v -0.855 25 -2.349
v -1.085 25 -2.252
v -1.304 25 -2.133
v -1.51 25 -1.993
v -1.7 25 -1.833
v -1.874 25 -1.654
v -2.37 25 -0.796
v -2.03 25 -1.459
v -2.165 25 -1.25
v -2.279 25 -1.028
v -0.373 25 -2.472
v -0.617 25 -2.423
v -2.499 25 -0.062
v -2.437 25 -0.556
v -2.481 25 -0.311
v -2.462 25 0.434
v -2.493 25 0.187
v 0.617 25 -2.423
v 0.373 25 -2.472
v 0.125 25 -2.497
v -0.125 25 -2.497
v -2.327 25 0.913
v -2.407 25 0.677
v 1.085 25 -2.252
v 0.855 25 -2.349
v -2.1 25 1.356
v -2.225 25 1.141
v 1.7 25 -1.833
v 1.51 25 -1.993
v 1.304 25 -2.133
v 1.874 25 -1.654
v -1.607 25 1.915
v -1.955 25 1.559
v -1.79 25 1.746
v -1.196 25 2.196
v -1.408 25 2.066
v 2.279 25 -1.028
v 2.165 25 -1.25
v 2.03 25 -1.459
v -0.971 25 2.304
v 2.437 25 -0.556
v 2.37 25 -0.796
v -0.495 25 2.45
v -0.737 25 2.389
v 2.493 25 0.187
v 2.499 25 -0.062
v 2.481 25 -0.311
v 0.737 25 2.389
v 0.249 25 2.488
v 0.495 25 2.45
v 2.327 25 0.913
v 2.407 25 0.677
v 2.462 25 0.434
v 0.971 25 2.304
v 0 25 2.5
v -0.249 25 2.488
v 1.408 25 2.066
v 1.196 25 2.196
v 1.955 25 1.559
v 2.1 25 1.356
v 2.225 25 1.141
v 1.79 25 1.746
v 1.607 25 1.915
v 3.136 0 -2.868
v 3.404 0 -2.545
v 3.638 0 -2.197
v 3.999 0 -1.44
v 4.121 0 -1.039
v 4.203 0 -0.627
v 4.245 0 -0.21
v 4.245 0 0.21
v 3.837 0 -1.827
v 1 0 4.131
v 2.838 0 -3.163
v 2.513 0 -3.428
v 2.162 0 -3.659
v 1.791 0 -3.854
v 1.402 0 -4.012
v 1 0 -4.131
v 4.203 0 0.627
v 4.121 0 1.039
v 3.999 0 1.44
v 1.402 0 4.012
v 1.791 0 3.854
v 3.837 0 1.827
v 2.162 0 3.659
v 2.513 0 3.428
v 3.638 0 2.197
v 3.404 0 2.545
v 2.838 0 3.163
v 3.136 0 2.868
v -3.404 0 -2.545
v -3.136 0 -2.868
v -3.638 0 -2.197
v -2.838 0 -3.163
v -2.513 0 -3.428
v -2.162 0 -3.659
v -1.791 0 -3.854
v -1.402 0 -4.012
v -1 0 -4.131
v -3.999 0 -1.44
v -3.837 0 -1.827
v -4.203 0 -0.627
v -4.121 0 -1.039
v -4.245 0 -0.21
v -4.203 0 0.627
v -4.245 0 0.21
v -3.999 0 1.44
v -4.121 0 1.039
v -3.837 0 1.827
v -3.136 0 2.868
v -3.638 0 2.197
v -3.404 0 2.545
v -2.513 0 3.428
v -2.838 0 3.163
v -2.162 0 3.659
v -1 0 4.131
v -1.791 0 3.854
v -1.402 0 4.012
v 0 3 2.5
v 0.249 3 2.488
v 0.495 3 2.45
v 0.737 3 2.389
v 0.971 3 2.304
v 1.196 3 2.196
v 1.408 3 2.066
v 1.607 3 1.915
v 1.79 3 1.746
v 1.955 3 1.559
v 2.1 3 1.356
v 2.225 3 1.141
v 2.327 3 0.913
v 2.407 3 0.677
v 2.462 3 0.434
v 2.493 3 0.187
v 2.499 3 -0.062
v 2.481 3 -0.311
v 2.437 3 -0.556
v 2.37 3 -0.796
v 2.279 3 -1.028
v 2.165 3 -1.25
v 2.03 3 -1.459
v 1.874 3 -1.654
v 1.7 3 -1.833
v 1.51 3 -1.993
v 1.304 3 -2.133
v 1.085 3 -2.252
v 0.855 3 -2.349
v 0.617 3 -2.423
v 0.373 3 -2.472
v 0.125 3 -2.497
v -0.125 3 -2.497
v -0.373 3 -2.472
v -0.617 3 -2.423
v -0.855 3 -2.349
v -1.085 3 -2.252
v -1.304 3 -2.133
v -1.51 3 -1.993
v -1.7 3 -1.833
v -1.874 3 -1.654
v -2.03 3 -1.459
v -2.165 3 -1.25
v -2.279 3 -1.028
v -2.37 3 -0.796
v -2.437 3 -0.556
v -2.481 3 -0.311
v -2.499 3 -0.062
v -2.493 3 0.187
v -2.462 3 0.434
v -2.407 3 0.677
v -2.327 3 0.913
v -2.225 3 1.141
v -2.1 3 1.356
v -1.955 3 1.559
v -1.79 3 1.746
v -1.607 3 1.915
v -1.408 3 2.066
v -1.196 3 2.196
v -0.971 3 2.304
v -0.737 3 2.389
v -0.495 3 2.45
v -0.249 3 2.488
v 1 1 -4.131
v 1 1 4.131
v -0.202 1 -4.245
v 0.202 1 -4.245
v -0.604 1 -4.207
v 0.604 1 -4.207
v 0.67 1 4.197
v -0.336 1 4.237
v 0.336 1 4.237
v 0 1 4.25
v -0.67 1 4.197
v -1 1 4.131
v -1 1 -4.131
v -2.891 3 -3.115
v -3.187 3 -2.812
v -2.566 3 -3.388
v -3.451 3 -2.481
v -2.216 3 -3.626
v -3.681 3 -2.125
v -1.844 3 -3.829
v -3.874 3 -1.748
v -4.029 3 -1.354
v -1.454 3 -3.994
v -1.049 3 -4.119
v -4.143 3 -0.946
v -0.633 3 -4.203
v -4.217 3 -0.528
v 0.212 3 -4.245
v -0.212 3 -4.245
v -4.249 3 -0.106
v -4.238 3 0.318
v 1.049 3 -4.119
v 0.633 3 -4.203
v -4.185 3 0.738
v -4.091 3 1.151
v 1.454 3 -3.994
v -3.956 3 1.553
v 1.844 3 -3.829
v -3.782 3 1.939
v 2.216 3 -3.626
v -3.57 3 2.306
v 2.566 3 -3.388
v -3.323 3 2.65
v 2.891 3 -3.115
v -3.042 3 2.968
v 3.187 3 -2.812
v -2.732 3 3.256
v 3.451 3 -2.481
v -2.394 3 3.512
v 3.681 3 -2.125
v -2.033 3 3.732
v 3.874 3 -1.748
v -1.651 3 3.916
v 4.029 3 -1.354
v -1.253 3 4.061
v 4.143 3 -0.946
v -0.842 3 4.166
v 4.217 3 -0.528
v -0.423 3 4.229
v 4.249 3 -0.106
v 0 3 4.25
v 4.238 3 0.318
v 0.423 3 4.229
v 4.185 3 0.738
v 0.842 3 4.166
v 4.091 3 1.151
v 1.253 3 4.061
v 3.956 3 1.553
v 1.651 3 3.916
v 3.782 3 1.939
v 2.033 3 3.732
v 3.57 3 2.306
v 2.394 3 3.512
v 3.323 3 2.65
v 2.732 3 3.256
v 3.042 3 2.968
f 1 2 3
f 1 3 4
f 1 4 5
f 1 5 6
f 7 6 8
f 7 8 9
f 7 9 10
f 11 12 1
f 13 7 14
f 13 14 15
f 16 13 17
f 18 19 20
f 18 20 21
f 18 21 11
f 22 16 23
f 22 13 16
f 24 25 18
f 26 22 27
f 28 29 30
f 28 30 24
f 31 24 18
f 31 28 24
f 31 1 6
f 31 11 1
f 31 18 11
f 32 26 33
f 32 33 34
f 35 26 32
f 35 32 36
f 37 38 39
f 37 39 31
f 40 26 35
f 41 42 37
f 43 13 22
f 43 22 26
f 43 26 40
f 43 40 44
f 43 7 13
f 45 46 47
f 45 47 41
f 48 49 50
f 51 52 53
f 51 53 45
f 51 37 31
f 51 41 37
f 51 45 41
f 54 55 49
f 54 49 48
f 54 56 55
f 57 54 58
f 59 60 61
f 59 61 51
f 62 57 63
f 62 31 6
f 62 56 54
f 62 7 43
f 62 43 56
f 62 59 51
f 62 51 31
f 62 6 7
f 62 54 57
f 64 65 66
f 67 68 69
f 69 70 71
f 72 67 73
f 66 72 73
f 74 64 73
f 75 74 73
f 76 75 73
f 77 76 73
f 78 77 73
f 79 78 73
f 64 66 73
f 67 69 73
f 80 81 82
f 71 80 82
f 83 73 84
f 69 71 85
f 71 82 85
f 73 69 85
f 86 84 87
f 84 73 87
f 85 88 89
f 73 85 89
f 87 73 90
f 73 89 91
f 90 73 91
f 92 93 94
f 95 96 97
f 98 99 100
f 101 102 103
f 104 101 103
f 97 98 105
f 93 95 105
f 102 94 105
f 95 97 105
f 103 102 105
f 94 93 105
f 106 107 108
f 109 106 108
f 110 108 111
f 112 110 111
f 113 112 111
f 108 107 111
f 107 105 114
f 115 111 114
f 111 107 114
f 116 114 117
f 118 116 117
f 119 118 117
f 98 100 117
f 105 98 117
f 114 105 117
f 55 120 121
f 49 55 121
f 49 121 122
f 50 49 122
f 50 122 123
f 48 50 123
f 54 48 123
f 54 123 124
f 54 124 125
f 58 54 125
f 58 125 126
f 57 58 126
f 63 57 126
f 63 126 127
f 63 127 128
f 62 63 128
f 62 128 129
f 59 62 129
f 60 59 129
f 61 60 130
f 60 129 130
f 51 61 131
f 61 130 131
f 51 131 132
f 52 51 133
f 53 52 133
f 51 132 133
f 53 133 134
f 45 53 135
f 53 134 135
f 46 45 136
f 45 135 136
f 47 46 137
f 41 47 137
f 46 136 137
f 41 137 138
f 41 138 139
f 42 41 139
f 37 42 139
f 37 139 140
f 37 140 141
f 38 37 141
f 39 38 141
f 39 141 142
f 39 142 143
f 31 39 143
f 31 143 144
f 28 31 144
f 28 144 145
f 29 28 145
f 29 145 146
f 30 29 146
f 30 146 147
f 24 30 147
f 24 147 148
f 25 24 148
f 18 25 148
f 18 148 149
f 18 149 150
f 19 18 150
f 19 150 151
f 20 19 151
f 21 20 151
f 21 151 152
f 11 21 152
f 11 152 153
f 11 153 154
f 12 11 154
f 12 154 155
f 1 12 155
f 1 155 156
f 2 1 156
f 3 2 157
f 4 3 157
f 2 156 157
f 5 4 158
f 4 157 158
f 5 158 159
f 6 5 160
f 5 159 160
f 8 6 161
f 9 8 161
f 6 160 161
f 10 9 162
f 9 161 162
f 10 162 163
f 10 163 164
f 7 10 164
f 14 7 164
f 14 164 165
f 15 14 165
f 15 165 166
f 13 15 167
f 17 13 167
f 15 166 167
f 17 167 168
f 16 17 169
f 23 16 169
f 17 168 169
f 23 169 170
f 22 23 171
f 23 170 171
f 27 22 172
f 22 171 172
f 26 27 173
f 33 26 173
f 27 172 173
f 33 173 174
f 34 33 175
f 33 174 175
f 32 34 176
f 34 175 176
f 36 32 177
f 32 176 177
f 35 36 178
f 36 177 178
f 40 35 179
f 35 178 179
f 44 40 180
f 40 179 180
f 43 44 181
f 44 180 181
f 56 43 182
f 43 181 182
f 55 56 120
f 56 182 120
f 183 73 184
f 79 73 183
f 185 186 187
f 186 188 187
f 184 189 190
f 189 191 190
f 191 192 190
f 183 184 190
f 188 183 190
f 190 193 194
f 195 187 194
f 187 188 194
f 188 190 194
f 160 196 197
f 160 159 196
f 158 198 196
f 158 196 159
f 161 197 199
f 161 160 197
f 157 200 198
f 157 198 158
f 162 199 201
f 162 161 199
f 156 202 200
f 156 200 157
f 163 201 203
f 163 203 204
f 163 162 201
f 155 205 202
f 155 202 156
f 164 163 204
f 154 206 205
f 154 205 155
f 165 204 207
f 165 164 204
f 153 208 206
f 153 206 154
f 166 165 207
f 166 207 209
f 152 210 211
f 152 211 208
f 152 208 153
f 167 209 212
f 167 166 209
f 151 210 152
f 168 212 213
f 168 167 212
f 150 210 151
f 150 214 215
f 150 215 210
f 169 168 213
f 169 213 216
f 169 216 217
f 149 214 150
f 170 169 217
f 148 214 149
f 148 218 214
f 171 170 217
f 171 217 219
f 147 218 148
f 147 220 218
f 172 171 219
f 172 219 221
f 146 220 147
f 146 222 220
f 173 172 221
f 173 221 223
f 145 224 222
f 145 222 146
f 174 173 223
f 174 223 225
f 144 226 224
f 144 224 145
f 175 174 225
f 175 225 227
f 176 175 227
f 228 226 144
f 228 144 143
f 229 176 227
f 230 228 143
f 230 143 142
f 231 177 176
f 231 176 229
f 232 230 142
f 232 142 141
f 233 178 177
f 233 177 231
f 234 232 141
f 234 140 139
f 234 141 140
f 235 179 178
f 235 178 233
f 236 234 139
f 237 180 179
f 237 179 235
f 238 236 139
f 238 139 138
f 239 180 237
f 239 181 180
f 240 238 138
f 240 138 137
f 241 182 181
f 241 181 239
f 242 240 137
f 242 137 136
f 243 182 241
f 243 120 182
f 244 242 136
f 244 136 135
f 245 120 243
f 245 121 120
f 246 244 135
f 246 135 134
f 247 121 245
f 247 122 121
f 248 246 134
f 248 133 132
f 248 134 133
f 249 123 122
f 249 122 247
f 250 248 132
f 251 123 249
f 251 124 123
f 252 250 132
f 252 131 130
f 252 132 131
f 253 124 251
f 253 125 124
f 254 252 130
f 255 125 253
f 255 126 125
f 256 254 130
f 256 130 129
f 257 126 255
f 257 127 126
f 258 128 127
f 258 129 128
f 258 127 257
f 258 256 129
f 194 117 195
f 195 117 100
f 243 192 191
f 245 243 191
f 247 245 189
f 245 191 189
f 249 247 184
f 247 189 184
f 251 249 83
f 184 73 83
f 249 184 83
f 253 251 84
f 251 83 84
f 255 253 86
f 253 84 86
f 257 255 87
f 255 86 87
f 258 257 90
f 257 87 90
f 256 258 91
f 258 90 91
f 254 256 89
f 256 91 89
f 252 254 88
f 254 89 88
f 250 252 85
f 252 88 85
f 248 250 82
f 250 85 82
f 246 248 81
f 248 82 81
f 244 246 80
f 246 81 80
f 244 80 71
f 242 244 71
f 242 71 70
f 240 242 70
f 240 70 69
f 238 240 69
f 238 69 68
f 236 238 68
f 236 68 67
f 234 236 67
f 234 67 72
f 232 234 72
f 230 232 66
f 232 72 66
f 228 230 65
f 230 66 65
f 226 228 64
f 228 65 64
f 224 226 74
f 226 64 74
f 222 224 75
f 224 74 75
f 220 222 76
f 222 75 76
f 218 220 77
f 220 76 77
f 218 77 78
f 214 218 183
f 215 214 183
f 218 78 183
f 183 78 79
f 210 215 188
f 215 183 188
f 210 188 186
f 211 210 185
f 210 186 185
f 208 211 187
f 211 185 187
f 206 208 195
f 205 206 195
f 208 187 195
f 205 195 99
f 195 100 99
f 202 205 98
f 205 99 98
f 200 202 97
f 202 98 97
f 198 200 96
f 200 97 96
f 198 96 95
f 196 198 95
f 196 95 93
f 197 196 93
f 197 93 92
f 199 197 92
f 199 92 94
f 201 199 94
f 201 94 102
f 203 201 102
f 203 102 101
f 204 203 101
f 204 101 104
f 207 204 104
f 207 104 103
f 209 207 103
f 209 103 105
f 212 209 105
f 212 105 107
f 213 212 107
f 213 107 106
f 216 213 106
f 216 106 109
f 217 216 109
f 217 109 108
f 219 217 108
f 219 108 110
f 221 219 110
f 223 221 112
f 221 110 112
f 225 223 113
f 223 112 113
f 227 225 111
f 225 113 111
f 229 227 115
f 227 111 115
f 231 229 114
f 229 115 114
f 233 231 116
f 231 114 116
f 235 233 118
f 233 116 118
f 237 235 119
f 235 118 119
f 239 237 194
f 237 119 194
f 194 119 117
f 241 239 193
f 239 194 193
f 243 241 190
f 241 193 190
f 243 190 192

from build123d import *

# Parameters (mm, degrees)
ESQUISSE1_R             = 4.25
ESQUISSE1_R_2           = 2.5
BOSS_EXTRU_1_DEPTH      = 3
ESQUISSE1_4_R           = 2.5
BOSS_EXTRU_3_DEPTH      = 25
ENL_V_MAT_EXTRU_1_DEPTH = 1


with BuildPart() as part:
    # Esquisse1 → Boss.-Extru.1 (new body)
    with BuildSketch(Plane(origin=(0, 0, 0), x_dir=(1, 0, 0), z_dir=(0, 1, 0))):
        Circle(ESQUISSE1_R)
        Circle(ESQUISSE1_R_2, mode=Mode.SUBTRACT)
    extrude(amount=BOSS_EXTRU_1_DEPTH)

    # Esquisse1<4> → Boss.-Extru.3 (add)
    with BuildSketch(Plane(origin=(0, 0, 0), x_dir=(1, 0, 0), z_dir=(0, 1, 0))):
        Circle(ESQUISSE1_4_R)
    extrude(amount=BOSS_EXTRU_3_DEPTH)

    # Esquisse2 → Enlèv. mat.-Extru.1 (cut)
    with BuildSketch(Plane.XZ):
        Polygon((-1, 0), (-1, 8), (1, 8), (1, -8), (-1, -8), align=None)
    extrude(amount=-ENL_V_MAT_EXTRU_1_DEPTH, mode=Mode.SUBTRACT)


solid = part.part
